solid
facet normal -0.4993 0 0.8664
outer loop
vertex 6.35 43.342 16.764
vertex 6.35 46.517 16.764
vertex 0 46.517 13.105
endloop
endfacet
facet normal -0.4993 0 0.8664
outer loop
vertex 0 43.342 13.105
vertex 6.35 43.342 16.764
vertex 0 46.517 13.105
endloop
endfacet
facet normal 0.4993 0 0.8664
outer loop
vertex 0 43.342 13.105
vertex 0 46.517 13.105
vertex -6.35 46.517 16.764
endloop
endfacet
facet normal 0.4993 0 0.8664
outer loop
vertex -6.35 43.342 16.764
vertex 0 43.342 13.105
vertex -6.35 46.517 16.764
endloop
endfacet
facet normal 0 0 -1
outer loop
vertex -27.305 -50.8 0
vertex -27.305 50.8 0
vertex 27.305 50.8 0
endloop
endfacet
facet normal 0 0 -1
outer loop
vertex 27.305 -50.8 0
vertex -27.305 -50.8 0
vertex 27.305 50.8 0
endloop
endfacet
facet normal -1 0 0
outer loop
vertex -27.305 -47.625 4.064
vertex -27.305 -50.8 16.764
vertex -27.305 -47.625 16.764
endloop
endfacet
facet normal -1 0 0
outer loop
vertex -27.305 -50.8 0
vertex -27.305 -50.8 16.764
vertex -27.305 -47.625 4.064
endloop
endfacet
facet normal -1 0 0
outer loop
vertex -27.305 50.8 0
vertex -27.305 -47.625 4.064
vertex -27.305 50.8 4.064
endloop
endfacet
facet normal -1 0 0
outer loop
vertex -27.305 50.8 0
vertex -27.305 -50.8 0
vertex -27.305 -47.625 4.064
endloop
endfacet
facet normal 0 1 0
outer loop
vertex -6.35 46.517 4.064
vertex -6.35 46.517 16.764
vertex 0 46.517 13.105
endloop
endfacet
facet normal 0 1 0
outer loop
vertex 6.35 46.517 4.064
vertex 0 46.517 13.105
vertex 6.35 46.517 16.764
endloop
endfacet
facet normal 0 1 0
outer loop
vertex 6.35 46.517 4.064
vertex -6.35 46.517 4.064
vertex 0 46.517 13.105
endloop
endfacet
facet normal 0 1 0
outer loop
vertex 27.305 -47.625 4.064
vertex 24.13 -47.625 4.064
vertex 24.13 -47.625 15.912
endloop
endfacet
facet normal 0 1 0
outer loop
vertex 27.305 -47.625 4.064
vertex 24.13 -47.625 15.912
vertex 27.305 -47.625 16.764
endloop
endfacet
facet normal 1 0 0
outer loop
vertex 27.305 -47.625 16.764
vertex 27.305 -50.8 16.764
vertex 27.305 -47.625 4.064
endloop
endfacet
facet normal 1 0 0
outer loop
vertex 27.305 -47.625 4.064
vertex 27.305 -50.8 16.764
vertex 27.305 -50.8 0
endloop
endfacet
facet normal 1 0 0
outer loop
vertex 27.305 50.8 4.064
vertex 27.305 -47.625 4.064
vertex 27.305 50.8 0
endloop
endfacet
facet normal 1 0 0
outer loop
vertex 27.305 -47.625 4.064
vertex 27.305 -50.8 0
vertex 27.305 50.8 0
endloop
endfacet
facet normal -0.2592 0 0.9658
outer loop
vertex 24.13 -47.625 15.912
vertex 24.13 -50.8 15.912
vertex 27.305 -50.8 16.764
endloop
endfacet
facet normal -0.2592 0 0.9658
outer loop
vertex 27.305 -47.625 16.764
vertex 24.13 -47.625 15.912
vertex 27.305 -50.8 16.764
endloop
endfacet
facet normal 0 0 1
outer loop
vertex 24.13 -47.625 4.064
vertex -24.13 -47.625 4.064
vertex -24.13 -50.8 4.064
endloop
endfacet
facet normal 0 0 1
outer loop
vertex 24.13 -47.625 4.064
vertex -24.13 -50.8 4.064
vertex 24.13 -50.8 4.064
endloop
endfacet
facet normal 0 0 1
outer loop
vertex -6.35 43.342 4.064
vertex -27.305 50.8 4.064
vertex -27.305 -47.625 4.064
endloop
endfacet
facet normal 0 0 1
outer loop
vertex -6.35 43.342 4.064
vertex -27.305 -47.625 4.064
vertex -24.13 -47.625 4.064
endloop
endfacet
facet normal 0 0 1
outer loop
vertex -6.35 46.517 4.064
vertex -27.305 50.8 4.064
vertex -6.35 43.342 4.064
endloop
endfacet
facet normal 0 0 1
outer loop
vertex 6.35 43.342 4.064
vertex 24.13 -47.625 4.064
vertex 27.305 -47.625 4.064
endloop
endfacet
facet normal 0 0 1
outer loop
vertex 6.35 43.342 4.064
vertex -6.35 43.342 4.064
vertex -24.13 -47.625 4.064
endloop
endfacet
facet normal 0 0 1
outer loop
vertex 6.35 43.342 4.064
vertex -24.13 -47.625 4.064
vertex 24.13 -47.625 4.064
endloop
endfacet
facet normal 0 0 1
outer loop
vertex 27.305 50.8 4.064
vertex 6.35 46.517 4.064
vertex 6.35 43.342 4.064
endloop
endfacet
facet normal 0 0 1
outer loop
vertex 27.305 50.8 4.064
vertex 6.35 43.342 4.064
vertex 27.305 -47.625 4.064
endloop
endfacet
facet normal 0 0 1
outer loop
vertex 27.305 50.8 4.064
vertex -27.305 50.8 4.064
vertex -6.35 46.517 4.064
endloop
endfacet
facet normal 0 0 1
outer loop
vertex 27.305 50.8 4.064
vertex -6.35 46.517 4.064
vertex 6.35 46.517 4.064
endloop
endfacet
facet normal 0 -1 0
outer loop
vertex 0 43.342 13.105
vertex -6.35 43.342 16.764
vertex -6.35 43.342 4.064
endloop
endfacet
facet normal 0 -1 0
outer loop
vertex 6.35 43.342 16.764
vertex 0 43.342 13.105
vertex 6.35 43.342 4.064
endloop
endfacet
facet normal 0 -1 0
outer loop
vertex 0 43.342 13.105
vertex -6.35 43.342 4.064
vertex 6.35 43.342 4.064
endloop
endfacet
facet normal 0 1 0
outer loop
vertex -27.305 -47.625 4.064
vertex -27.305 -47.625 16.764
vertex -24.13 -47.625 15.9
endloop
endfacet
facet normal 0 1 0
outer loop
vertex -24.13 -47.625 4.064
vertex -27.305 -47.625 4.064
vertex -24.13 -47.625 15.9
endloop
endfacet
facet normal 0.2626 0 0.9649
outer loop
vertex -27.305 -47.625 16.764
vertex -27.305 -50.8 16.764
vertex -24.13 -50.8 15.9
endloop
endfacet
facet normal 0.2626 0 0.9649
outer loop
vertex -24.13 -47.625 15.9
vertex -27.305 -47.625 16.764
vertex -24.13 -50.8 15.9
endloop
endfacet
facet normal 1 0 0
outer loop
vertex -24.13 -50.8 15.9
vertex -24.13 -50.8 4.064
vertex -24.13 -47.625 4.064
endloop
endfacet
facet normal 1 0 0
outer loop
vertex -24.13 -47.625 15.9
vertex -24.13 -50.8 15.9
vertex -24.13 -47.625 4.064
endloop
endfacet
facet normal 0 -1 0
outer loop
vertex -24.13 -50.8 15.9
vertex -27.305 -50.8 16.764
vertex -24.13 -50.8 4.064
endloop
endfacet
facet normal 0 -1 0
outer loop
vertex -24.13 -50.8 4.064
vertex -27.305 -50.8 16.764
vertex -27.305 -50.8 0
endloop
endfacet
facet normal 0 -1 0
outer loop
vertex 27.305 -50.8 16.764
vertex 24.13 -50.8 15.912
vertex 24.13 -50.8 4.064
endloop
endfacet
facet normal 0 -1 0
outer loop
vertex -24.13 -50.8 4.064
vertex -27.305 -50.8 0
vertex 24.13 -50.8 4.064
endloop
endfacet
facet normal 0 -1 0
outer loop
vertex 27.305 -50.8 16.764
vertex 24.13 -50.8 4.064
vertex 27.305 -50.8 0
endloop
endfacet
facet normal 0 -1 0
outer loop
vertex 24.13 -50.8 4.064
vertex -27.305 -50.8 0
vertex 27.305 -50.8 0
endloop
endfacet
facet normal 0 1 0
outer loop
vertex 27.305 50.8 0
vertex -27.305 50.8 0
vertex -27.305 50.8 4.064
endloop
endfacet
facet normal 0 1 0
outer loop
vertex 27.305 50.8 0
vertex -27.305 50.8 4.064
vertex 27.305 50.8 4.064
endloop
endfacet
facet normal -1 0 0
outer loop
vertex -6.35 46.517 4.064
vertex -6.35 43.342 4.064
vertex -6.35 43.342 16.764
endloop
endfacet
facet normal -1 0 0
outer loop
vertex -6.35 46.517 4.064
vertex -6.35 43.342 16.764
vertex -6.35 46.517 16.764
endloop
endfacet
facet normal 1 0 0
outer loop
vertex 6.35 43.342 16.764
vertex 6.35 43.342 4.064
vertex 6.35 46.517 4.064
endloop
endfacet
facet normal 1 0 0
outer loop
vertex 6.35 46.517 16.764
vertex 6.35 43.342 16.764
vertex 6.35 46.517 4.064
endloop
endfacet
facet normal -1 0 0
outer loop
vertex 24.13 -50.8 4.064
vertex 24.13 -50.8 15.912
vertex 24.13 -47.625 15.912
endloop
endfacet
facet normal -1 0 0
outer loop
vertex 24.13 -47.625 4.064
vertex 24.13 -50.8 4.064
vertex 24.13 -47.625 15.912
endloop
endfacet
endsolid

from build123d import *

# Parameters (mm, degrees)
F0_W     = 54.61
F0_H     = 101.6
F1_DEPTH = 4.064
F2_W     = 12.7
F2_H     = 3.175
F3_DEPTH = 12.7
F5_DEPTH = 25.4
F6_W     = 3.175
F6_H     = 3.175
F7_DEPTH = 12.7
F9_DEPTH = 25.4


with BuildPart() as f1:
    # F0 (on Top) → F1 (new body)
    with BuildSketch(Plane.XY):
        Rectangle(F0_W, F0_H)
    extrude(amount=F1_DEPTH)

    # F2 (on face) → F3 (join)
    with BuildSketch(Plane.XY.offset(4.064)):
        with Locations((0, 44.929545)):
            Rectangle(F2_W, F2_H)
    extrude(amount=F3_DEPTH)

    # F4 (on face) → F5 (cut)
    with BuildSketch(Plane(origin=(0, 46.517045, 0), x_dir=(-1, 0, 0), z_dir=(0, 1, 0))):
        Polygon((-6.35, 16.764), (0, 13.105086), (6.35, 16.764), align=None)
    extrude(amount=-F5_DEPTH, mode=Mode.SUBTRACT)

    # F6 (on face) → F7 (join)
    with BuildSketch(Plane.XY.offset(4.064)):
        with Locations((-25.7175, -49.2125)):
            Rectangle(F6_W, F6_H)
        with Locations((25.7175, -49.2125)):
            Rectangle(F6_W, F6_H)
    extrude(amount=F7_DEPTH)

    # F8 (on face) → F9 (cut)
    with BuildSketch(Plane.XZ.offset(50.8)):
        Polygon((-24.13, 16.764), (-27.305, 16.764), (-24.13, 15.9004), align=None)
        Polygon((24.13, 15.911566), (27.305, 16.764), (24.13, 16.764), align=None)
    extrude(amount=-F9_DEPTH, mode=Mode.SUBTRACT)


solid = f1.part
